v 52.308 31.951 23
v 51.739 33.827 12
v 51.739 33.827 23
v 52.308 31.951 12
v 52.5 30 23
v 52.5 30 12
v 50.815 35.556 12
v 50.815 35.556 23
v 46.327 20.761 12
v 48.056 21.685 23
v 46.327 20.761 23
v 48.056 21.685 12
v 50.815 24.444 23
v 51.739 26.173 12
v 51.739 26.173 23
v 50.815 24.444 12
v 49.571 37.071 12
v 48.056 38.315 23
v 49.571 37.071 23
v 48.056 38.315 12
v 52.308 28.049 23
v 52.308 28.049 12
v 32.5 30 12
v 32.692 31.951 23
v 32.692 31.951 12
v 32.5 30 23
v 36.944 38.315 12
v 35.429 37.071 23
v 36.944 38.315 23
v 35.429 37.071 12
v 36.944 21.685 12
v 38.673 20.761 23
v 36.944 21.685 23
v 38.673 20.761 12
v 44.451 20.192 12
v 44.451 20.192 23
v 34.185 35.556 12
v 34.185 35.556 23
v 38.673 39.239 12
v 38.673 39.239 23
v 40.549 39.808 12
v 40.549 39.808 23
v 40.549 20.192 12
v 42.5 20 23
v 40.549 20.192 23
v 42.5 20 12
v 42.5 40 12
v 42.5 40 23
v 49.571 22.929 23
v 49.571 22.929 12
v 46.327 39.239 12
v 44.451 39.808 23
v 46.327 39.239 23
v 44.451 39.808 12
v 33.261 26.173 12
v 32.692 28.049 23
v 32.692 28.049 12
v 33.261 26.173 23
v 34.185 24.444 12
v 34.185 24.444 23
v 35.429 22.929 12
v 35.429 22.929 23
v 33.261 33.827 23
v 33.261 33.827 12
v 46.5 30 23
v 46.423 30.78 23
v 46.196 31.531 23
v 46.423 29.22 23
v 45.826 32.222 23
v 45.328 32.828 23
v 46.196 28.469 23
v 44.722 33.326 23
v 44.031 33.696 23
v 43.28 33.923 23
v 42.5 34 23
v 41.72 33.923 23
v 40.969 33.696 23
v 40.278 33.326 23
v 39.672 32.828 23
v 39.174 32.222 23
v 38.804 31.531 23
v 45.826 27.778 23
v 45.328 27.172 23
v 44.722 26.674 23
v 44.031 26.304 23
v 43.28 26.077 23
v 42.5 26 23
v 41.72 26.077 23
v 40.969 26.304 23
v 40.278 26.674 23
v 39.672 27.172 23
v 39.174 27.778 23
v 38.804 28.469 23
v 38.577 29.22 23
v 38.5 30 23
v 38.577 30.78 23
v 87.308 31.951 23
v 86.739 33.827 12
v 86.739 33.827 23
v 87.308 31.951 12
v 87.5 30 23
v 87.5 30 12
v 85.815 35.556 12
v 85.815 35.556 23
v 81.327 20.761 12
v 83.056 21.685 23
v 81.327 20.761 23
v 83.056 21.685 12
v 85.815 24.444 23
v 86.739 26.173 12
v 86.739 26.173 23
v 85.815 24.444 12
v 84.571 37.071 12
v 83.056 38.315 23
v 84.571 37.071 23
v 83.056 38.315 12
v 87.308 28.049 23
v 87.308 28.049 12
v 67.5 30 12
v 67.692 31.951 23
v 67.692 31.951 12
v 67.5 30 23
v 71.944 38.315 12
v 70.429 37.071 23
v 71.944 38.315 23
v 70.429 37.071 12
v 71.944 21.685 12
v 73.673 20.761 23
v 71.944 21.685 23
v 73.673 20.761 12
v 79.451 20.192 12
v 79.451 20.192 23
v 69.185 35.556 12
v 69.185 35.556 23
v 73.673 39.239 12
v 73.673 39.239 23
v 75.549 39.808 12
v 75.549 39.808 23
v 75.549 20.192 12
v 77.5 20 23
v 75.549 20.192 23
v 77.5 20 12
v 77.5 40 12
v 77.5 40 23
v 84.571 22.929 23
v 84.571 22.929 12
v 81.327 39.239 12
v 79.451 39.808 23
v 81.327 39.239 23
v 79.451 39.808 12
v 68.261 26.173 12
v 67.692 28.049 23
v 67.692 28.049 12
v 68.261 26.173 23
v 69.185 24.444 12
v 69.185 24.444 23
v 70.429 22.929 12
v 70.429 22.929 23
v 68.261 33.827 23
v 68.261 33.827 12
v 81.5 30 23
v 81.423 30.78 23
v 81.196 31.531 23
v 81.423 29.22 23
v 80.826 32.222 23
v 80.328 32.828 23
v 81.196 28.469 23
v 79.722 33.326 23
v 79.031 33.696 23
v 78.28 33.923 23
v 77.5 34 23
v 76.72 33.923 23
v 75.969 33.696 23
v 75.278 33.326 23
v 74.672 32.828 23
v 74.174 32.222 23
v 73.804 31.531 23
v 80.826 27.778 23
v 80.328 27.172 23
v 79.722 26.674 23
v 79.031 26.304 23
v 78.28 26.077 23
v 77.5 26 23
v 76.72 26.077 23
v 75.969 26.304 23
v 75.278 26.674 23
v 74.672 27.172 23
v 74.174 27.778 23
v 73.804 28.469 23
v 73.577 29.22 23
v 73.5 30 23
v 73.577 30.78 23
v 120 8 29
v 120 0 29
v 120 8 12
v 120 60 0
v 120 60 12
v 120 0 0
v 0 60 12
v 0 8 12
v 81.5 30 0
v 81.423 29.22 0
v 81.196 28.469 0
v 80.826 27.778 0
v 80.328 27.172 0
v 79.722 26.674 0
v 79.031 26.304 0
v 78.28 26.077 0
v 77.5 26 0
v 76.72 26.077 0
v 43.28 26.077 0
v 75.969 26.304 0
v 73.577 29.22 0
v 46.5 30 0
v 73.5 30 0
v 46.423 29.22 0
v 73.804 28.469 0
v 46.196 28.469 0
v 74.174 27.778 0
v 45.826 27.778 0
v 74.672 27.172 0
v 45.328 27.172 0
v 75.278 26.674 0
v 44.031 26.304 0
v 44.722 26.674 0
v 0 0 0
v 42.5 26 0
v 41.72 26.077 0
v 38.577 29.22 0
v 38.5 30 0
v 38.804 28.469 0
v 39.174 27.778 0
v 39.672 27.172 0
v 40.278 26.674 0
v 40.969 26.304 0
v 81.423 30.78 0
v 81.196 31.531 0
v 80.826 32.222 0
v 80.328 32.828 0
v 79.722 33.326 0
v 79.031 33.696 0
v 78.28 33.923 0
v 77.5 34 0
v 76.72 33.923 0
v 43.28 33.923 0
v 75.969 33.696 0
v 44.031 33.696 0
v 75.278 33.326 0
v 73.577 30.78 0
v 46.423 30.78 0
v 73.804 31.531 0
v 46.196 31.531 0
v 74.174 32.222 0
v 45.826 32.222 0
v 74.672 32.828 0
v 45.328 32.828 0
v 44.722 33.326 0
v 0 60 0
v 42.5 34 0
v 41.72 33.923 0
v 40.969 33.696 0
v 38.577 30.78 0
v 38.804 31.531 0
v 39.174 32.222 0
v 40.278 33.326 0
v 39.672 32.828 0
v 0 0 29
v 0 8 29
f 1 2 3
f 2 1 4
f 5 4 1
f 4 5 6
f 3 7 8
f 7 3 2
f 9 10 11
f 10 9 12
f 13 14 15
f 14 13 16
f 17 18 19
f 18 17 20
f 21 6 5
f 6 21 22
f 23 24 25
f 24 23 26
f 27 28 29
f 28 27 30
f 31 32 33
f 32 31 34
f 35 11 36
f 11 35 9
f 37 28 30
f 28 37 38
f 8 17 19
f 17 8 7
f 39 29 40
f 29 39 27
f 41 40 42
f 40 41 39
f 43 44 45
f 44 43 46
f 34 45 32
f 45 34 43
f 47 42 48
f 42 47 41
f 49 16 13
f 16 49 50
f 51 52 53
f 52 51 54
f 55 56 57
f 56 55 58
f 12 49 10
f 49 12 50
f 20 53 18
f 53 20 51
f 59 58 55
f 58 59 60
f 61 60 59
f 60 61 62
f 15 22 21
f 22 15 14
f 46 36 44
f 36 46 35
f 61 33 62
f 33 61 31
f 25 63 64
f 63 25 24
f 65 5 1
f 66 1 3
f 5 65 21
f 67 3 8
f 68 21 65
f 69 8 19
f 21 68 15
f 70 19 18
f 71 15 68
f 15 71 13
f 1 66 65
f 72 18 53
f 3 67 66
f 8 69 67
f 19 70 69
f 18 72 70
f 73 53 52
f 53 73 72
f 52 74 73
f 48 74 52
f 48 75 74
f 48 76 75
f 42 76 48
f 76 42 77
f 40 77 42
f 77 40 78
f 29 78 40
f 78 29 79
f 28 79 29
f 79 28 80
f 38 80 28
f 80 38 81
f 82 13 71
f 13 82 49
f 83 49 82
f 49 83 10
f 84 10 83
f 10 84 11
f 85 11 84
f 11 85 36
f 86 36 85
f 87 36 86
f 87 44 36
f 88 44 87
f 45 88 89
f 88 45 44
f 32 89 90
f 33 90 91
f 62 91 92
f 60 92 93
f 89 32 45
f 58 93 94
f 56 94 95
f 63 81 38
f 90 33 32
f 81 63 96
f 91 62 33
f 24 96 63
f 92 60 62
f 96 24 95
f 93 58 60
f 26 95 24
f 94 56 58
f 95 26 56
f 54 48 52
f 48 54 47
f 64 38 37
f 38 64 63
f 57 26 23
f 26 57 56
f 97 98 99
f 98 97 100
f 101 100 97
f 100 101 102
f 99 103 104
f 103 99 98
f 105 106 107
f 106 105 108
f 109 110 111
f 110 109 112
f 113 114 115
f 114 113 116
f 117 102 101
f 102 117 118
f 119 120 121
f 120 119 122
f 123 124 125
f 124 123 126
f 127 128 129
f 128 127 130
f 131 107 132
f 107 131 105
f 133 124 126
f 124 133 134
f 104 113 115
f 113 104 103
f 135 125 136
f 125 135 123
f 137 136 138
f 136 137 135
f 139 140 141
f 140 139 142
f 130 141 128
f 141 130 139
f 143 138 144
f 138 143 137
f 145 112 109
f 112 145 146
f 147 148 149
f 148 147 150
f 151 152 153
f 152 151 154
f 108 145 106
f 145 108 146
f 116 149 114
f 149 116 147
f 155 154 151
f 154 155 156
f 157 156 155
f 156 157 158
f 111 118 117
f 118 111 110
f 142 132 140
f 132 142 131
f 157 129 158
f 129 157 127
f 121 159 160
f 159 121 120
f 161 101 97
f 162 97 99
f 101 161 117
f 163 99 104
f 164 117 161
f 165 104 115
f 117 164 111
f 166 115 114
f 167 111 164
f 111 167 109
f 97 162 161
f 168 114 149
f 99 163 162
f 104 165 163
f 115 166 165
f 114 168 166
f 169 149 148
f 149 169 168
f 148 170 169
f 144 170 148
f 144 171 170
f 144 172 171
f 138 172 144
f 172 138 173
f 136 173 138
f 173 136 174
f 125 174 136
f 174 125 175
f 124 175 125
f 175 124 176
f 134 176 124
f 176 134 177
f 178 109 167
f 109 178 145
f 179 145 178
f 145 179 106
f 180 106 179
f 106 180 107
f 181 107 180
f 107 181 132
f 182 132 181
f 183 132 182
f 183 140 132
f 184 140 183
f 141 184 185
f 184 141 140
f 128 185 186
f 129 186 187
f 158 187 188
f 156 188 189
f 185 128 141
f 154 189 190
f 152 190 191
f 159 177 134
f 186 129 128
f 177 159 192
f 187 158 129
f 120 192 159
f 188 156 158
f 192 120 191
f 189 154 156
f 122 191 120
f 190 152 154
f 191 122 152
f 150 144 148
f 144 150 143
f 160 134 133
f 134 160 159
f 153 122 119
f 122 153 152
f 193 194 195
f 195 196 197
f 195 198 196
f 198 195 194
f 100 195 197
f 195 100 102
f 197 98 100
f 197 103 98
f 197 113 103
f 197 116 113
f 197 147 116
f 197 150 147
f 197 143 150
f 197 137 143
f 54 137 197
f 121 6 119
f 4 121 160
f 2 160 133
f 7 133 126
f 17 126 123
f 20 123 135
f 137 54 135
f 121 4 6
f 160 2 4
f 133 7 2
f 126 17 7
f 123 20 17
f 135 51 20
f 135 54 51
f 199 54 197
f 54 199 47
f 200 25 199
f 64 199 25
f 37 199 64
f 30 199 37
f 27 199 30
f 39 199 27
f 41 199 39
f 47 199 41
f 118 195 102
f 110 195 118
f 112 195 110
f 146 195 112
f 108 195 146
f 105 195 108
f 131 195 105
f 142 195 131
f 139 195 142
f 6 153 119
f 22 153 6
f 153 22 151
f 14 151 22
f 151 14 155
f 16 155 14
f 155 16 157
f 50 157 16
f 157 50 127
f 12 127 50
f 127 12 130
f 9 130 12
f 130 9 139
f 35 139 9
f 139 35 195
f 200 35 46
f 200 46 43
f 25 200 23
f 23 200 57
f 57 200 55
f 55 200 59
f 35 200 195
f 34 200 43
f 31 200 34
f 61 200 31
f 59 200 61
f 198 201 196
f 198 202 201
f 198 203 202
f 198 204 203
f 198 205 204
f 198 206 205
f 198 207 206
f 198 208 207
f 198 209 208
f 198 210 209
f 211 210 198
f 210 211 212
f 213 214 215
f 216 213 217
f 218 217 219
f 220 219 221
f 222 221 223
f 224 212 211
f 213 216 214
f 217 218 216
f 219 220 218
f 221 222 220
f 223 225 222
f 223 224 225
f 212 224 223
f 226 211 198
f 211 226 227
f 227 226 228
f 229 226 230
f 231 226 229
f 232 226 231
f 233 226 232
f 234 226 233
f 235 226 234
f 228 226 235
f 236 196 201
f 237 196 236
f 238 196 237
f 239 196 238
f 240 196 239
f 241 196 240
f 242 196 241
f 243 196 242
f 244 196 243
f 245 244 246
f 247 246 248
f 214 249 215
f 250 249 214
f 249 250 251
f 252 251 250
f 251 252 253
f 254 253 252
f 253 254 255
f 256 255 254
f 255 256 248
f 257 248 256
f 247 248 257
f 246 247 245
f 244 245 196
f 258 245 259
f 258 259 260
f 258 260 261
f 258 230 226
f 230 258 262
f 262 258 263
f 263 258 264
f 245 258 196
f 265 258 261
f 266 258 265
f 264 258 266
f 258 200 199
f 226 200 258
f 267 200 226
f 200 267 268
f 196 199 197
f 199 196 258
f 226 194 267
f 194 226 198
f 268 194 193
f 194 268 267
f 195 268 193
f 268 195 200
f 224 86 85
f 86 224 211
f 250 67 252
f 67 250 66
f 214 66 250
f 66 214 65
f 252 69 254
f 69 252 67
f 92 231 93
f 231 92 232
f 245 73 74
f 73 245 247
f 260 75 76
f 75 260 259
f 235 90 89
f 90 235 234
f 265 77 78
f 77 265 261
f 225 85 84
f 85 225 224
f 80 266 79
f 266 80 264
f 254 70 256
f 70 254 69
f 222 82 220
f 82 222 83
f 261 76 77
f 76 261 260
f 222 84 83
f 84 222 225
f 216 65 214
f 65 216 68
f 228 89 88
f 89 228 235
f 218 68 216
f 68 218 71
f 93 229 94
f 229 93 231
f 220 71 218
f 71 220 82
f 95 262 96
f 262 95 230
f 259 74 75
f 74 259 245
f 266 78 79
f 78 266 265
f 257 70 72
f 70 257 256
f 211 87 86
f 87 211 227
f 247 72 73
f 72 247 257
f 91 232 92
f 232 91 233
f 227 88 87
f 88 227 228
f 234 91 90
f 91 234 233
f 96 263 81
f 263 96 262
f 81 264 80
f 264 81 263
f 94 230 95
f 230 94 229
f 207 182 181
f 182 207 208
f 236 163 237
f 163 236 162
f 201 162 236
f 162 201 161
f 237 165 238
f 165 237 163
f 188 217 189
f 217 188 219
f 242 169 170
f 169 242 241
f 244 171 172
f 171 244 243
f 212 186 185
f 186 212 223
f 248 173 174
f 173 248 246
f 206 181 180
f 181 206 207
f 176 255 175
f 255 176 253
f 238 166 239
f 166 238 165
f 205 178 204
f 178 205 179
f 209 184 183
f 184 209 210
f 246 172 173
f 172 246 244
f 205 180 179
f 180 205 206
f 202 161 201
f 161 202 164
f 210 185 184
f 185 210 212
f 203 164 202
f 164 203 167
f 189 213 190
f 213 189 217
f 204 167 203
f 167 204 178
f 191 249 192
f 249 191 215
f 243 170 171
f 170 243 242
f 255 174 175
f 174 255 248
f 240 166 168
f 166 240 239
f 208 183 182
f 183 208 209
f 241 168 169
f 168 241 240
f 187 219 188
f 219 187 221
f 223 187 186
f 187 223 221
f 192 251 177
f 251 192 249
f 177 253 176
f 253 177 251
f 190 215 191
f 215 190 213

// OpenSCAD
$fn = 32;

// ----------------------------------------------------------------------
// Drill jig: fence jig
// ----------------------------------------------------------------------

// --- parameters (mm) ---
plate_l = 120;            // plate length, X
plate_w = 60;             // plate width, Y
plate_t = 12;             // plate thickness
boss_d = 20;              // guide boss diameter
boss_h = 12;              // boss height above the plate
guide_d = 8;              // guide hole diameter
boss_pitch = 35;          // boss pitch
fence_h = 18;             // fence height above the plate
fence_t = 8;              // fence thickness

n_boss = 2;  // guide bosses
boss_x0 = (plate_l - (n_boss - 1) * boss_pitch) / 2;  // first boss X
boss_top = plate_t - 1 + boss_h;  // boss crown height
fence_top = plate_t - 1 + fence_h;  // fence crown height
total_h = max([fence_top, boss_top]);  // overall height

difference() {
  union() {
  cube([plate_l, plate_w, plate_t]);
  for (i = [0 : n_boss - 1])
    translate([boss_x0 + i * boss_pitch, plate_w / 2, plate_t - 1])
      cylinder(h = boss_h, d = boss_d);
  translate([0, 0, plate_t - 1]) cube([plate_l, fence_t, fence_h]);
  }
  for (i = [0 : n_boss - 1])
    translate([boss_x0 + i * boss_pitch, plate_w / 2, -1])
      cylinder(h = plate_t + boss_h, d = guide_d);
}
